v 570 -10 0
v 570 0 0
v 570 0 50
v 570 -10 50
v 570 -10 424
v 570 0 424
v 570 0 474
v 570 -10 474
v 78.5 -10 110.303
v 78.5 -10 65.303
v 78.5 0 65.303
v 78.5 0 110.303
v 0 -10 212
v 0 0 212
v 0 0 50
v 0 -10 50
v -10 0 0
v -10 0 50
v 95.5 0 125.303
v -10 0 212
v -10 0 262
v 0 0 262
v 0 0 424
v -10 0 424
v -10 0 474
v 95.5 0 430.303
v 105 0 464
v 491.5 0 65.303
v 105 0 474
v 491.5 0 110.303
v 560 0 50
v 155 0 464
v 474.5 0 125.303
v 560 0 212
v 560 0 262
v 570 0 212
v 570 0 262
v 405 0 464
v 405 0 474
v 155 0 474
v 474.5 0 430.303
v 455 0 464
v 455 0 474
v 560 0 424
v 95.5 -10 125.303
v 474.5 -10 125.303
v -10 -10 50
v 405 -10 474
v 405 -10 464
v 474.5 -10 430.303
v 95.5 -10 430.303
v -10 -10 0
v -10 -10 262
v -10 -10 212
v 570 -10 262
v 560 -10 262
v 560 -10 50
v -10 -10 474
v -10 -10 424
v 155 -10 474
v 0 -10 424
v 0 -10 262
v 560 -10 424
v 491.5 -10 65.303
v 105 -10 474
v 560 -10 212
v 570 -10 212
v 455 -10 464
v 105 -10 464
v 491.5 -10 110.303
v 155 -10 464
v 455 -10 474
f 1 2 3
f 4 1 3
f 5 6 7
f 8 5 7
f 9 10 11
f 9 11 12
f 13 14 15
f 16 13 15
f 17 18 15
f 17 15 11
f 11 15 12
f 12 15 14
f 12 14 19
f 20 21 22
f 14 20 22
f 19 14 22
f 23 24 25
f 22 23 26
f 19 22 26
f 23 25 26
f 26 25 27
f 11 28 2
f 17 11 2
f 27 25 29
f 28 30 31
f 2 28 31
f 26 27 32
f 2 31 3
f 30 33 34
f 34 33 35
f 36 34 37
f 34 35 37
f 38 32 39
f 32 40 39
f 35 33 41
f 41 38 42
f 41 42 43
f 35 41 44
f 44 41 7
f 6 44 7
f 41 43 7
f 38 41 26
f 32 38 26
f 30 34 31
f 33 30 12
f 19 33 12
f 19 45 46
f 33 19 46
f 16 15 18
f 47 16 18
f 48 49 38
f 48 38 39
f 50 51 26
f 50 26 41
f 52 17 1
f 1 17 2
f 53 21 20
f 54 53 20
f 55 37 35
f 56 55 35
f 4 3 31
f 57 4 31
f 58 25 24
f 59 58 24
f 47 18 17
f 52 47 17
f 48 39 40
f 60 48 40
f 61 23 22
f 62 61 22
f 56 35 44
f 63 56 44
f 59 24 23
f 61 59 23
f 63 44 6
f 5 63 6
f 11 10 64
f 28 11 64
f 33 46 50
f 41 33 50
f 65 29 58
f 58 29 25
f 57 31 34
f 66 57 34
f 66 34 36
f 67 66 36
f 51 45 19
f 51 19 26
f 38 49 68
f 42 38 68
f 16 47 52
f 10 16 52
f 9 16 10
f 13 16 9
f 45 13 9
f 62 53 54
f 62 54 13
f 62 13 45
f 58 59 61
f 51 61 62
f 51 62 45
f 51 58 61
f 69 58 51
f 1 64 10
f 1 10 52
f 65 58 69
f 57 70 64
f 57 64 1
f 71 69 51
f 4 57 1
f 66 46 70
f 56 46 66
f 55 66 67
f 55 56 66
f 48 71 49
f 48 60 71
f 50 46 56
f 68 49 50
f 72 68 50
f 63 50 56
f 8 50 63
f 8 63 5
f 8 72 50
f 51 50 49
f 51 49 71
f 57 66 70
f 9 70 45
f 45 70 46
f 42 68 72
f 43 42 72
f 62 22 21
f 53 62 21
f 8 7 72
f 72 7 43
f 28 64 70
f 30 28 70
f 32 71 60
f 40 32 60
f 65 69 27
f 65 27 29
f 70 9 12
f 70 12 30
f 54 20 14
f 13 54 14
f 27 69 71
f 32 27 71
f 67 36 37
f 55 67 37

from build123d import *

# Parameters (mm, degrees)
PAD_DEPTH       = 10
SKETCH001_W     = 379
SKETCH001_H     = 305
SKETCH001_W_2   = 413
SKETCH001_H_2   = 45
POCKET_DEPTH    = 10.001
SKETCH002_W     = 50
SKETCH002_H     = 10
POCKET001_DEPTH = 10.001


with BuildPart() as part:
    # Sketch → Pad (new body)
    with BuildSketch(Plane.XZ):
        Polygon((0, 0), (560, 0), (570, 0), (570, 50), (560, 50), (560, 212), (570, 212), (570, 262), (560, 262), (560, 424), (570, 424), (570, 474), (560, 474), (0, 474), (-10, 474), (-10, 424), (0, 424), (0, 262), (-10, 262), (-10, 212), (0, 212), (0, 50), (-10, 50), (-10, 0), align=None)
    extrude(amount=PAD_DEPTH)

    # Sketch001 → Pocket (cut, through all)
    with BuildSketch(Plane.XZ.offset(10)):
        with Locations((285, 277.802533)):
            Rectangle(SKETCH001_W, SKETCH001_H)
        with Locations((285, 87.802533)):
            Rectangle(SKETCH001_W_2, SKETCH001_H_2)
    extrude(amount=-POCKET_DEPTH, mode=Mode.SUBTRACT)

    # Sketch002 → Pocket001 (cut, through all)
    with BuildSketch(Plane.XZ.offset(10)):
        with Locations((130, 469)):
            Rectangle(SKETCH002_W, SKETCH002_H)
        with Locations((430, 469)):
            Rectangle(SKETCH002_W, SKETCH002_H)
    extrude(amount=-POCKET001_DEPTH, mode=Mode.SUBTRACT)


solid = part.part
